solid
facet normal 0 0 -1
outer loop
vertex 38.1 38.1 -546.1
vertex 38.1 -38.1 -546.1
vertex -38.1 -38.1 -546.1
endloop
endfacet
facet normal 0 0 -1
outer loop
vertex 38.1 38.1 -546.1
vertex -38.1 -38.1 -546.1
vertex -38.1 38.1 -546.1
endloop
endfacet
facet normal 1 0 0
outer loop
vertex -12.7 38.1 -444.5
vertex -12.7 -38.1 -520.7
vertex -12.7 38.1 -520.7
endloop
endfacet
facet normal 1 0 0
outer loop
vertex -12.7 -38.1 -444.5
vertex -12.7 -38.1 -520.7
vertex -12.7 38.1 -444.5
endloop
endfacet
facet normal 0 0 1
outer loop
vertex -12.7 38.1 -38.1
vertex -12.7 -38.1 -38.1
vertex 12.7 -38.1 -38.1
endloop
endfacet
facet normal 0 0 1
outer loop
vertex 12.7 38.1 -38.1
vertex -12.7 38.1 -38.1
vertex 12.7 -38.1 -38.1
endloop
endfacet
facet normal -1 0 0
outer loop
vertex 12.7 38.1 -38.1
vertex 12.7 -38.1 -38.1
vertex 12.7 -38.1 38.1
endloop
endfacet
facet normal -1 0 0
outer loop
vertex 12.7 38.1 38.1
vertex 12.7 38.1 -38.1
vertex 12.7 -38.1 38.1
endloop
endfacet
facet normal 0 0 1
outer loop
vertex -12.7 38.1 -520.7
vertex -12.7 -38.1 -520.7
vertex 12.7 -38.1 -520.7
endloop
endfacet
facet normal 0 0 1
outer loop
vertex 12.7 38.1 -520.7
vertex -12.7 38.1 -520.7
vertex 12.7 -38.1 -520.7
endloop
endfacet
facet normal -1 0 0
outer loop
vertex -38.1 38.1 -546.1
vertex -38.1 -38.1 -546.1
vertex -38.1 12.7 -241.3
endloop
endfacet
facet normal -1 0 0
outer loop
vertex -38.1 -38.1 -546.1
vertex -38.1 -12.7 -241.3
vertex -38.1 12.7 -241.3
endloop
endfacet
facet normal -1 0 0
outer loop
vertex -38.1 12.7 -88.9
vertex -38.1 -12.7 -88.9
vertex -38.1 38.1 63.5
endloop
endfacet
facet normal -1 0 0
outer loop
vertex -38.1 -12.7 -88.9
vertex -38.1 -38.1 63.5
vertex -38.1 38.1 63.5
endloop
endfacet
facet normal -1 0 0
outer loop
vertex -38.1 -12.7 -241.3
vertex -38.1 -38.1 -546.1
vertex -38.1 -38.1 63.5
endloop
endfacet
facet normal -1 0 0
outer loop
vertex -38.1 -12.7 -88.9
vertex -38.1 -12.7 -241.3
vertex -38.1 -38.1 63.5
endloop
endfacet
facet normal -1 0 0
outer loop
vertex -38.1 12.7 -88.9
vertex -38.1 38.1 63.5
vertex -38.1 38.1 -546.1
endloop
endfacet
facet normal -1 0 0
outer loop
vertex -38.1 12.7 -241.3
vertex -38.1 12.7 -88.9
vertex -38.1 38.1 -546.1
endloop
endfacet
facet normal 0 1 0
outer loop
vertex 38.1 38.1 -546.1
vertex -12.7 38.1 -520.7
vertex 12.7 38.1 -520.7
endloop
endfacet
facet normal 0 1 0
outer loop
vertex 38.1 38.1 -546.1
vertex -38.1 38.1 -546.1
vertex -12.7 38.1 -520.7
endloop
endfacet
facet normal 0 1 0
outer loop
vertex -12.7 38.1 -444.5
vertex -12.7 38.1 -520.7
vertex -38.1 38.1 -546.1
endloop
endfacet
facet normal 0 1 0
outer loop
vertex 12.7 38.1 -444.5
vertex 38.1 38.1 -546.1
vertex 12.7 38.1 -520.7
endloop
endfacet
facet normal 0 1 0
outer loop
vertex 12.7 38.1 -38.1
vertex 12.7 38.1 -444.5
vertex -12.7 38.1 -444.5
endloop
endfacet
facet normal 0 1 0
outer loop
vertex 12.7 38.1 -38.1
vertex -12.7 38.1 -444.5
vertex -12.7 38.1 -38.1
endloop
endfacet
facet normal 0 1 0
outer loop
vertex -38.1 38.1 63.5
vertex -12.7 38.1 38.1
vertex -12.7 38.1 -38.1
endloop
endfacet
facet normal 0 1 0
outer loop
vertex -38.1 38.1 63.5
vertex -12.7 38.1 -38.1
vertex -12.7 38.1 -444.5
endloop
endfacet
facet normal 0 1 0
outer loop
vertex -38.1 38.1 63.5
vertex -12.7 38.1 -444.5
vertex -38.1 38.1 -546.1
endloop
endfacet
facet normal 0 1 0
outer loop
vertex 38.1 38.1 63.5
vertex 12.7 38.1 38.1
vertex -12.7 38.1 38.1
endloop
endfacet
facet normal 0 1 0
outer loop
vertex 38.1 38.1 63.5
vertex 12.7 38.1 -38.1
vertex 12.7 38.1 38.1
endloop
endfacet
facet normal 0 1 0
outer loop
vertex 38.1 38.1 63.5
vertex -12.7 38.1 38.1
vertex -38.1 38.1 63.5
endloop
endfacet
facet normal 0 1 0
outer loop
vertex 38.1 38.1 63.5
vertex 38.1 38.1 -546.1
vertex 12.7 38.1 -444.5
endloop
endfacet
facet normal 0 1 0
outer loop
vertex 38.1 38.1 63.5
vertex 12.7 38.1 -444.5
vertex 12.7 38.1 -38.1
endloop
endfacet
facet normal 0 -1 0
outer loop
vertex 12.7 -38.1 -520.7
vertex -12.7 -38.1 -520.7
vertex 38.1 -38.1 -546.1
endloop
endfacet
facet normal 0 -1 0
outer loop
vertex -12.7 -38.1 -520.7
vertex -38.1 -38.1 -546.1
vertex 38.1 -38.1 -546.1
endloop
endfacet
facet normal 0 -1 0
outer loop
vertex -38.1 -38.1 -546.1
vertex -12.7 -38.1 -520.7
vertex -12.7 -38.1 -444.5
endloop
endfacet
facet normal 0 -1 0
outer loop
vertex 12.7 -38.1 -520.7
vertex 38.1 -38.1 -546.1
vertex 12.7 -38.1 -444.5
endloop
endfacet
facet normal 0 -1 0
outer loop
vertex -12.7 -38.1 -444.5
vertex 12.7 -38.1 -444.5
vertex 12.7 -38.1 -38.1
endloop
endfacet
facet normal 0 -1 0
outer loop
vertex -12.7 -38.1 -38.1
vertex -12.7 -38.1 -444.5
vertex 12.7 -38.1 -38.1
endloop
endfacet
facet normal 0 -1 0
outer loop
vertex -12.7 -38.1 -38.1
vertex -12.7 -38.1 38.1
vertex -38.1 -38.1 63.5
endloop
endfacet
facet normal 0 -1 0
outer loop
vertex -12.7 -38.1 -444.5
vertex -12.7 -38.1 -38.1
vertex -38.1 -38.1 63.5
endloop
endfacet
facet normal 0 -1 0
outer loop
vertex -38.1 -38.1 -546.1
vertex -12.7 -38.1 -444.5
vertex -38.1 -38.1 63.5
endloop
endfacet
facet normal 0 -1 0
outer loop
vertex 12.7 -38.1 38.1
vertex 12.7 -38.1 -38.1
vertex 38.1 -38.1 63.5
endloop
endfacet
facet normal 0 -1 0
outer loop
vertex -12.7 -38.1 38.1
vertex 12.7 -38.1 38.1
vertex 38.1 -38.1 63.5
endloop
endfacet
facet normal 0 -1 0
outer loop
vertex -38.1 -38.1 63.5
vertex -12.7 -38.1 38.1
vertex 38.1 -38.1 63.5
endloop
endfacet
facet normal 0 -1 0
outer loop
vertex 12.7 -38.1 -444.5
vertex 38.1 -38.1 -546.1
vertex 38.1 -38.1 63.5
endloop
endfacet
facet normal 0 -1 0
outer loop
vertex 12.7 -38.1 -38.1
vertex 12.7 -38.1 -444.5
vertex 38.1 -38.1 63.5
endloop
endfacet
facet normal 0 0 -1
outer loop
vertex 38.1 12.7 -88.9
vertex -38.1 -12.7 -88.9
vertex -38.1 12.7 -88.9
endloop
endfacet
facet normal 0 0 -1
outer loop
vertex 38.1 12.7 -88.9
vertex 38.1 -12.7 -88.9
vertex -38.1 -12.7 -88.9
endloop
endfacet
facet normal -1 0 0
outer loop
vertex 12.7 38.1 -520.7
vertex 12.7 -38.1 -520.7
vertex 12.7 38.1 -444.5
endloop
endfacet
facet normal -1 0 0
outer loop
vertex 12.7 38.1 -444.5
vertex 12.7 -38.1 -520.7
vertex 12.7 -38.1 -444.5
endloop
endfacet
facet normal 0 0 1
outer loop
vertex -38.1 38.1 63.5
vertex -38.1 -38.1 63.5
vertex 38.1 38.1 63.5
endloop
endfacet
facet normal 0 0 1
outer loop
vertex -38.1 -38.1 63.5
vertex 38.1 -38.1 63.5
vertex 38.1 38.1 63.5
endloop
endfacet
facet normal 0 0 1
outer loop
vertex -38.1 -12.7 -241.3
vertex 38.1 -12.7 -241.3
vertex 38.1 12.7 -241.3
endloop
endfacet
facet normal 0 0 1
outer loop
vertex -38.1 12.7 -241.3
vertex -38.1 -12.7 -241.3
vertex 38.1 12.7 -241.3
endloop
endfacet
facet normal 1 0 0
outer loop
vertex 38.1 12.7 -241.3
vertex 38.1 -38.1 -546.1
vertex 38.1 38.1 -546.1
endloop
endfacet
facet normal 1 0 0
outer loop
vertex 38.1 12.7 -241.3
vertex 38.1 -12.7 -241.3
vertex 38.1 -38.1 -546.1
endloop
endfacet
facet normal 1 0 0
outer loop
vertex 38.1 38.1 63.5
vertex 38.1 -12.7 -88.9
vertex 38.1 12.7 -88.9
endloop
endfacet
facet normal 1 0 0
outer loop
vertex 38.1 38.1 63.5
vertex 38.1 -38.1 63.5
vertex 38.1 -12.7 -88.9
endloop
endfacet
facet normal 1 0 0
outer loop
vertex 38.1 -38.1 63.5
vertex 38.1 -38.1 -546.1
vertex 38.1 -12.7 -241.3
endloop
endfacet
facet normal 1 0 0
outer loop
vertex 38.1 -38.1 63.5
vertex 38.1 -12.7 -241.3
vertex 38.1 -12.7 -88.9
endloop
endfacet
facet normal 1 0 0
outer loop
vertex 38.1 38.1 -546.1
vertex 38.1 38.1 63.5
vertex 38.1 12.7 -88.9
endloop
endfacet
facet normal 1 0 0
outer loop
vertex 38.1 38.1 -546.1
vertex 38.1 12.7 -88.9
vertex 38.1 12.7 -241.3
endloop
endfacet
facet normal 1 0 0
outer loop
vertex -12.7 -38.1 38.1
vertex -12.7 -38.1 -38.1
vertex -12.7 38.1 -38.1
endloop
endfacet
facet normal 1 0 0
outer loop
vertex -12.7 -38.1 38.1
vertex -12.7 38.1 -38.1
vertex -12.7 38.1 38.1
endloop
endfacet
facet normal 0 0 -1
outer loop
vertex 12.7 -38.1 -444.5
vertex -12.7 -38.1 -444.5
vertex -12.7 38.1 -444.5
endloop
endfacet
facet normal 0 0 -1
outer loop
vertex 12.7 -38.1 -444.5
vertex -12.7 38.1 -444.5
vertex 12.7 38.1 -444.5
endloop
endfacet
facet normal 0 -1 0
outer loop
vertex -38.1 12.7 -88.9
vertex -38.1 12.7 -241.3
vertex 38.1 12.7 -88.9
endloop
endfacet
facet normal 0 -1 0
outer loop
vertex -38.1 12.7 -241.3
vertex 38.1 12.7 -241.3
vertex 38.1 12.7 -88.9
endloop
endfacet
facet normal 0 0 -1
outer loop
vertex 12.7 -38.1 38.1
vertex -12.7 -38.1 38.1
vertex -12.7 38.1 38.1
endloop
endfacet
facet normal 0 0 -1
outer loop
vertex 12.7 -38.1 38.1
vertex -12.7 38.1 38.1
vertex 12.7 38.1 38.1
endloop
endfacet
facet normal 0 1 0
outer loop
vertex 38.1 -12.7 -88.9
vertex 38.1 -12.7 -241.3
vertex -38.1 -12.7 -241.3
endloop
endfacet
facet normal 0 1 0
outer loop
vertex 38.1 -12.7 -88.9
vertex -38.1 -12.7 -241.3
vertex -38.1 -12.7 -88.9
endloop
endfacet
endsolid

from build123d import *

# Parameters (mm, degrees)
F0_W          = 76.2
F0_H          = 609.6
F0_W_2        = 25.4
F0_H_2        = 152.4
F1_DEPTH      = 38.1
F1_DEPTH_BACK = 38.1
F2_W          = 25.4
F2_H          = 76.2
F3_DEPTH      = 101.6


with BuildPart() as f1:
    # F0 (on Right) → F1 (new body, two sides)
    with BuildSketch(Plane.YZ) as f1_sk:
        with Locations((0, -241.3)):
            Rectangle(F0_W, F0_H)
        with Locations((0, -165.1)):
            Rectangle(F0_W_2, F0_H_2, mode=Mode.SUBTRACT)
    extrude(amount=F1_DEPTH)
    extrude(f1_sk.sketch, amount=-F1_DEPTH_BACK)

    # F2 (on face) → F3 (cut)
    with BuildSketch(Plane.XZ.offset(38.1)):
        Rectangle(F2_W, F2_H)
        with Locations((0, -482.6)):
            Rectangle(F2_W, F2_H)
    extrude(amount=-F3_DEPTH, mode=Mode.SUBTRACT)


solid = f1.part
